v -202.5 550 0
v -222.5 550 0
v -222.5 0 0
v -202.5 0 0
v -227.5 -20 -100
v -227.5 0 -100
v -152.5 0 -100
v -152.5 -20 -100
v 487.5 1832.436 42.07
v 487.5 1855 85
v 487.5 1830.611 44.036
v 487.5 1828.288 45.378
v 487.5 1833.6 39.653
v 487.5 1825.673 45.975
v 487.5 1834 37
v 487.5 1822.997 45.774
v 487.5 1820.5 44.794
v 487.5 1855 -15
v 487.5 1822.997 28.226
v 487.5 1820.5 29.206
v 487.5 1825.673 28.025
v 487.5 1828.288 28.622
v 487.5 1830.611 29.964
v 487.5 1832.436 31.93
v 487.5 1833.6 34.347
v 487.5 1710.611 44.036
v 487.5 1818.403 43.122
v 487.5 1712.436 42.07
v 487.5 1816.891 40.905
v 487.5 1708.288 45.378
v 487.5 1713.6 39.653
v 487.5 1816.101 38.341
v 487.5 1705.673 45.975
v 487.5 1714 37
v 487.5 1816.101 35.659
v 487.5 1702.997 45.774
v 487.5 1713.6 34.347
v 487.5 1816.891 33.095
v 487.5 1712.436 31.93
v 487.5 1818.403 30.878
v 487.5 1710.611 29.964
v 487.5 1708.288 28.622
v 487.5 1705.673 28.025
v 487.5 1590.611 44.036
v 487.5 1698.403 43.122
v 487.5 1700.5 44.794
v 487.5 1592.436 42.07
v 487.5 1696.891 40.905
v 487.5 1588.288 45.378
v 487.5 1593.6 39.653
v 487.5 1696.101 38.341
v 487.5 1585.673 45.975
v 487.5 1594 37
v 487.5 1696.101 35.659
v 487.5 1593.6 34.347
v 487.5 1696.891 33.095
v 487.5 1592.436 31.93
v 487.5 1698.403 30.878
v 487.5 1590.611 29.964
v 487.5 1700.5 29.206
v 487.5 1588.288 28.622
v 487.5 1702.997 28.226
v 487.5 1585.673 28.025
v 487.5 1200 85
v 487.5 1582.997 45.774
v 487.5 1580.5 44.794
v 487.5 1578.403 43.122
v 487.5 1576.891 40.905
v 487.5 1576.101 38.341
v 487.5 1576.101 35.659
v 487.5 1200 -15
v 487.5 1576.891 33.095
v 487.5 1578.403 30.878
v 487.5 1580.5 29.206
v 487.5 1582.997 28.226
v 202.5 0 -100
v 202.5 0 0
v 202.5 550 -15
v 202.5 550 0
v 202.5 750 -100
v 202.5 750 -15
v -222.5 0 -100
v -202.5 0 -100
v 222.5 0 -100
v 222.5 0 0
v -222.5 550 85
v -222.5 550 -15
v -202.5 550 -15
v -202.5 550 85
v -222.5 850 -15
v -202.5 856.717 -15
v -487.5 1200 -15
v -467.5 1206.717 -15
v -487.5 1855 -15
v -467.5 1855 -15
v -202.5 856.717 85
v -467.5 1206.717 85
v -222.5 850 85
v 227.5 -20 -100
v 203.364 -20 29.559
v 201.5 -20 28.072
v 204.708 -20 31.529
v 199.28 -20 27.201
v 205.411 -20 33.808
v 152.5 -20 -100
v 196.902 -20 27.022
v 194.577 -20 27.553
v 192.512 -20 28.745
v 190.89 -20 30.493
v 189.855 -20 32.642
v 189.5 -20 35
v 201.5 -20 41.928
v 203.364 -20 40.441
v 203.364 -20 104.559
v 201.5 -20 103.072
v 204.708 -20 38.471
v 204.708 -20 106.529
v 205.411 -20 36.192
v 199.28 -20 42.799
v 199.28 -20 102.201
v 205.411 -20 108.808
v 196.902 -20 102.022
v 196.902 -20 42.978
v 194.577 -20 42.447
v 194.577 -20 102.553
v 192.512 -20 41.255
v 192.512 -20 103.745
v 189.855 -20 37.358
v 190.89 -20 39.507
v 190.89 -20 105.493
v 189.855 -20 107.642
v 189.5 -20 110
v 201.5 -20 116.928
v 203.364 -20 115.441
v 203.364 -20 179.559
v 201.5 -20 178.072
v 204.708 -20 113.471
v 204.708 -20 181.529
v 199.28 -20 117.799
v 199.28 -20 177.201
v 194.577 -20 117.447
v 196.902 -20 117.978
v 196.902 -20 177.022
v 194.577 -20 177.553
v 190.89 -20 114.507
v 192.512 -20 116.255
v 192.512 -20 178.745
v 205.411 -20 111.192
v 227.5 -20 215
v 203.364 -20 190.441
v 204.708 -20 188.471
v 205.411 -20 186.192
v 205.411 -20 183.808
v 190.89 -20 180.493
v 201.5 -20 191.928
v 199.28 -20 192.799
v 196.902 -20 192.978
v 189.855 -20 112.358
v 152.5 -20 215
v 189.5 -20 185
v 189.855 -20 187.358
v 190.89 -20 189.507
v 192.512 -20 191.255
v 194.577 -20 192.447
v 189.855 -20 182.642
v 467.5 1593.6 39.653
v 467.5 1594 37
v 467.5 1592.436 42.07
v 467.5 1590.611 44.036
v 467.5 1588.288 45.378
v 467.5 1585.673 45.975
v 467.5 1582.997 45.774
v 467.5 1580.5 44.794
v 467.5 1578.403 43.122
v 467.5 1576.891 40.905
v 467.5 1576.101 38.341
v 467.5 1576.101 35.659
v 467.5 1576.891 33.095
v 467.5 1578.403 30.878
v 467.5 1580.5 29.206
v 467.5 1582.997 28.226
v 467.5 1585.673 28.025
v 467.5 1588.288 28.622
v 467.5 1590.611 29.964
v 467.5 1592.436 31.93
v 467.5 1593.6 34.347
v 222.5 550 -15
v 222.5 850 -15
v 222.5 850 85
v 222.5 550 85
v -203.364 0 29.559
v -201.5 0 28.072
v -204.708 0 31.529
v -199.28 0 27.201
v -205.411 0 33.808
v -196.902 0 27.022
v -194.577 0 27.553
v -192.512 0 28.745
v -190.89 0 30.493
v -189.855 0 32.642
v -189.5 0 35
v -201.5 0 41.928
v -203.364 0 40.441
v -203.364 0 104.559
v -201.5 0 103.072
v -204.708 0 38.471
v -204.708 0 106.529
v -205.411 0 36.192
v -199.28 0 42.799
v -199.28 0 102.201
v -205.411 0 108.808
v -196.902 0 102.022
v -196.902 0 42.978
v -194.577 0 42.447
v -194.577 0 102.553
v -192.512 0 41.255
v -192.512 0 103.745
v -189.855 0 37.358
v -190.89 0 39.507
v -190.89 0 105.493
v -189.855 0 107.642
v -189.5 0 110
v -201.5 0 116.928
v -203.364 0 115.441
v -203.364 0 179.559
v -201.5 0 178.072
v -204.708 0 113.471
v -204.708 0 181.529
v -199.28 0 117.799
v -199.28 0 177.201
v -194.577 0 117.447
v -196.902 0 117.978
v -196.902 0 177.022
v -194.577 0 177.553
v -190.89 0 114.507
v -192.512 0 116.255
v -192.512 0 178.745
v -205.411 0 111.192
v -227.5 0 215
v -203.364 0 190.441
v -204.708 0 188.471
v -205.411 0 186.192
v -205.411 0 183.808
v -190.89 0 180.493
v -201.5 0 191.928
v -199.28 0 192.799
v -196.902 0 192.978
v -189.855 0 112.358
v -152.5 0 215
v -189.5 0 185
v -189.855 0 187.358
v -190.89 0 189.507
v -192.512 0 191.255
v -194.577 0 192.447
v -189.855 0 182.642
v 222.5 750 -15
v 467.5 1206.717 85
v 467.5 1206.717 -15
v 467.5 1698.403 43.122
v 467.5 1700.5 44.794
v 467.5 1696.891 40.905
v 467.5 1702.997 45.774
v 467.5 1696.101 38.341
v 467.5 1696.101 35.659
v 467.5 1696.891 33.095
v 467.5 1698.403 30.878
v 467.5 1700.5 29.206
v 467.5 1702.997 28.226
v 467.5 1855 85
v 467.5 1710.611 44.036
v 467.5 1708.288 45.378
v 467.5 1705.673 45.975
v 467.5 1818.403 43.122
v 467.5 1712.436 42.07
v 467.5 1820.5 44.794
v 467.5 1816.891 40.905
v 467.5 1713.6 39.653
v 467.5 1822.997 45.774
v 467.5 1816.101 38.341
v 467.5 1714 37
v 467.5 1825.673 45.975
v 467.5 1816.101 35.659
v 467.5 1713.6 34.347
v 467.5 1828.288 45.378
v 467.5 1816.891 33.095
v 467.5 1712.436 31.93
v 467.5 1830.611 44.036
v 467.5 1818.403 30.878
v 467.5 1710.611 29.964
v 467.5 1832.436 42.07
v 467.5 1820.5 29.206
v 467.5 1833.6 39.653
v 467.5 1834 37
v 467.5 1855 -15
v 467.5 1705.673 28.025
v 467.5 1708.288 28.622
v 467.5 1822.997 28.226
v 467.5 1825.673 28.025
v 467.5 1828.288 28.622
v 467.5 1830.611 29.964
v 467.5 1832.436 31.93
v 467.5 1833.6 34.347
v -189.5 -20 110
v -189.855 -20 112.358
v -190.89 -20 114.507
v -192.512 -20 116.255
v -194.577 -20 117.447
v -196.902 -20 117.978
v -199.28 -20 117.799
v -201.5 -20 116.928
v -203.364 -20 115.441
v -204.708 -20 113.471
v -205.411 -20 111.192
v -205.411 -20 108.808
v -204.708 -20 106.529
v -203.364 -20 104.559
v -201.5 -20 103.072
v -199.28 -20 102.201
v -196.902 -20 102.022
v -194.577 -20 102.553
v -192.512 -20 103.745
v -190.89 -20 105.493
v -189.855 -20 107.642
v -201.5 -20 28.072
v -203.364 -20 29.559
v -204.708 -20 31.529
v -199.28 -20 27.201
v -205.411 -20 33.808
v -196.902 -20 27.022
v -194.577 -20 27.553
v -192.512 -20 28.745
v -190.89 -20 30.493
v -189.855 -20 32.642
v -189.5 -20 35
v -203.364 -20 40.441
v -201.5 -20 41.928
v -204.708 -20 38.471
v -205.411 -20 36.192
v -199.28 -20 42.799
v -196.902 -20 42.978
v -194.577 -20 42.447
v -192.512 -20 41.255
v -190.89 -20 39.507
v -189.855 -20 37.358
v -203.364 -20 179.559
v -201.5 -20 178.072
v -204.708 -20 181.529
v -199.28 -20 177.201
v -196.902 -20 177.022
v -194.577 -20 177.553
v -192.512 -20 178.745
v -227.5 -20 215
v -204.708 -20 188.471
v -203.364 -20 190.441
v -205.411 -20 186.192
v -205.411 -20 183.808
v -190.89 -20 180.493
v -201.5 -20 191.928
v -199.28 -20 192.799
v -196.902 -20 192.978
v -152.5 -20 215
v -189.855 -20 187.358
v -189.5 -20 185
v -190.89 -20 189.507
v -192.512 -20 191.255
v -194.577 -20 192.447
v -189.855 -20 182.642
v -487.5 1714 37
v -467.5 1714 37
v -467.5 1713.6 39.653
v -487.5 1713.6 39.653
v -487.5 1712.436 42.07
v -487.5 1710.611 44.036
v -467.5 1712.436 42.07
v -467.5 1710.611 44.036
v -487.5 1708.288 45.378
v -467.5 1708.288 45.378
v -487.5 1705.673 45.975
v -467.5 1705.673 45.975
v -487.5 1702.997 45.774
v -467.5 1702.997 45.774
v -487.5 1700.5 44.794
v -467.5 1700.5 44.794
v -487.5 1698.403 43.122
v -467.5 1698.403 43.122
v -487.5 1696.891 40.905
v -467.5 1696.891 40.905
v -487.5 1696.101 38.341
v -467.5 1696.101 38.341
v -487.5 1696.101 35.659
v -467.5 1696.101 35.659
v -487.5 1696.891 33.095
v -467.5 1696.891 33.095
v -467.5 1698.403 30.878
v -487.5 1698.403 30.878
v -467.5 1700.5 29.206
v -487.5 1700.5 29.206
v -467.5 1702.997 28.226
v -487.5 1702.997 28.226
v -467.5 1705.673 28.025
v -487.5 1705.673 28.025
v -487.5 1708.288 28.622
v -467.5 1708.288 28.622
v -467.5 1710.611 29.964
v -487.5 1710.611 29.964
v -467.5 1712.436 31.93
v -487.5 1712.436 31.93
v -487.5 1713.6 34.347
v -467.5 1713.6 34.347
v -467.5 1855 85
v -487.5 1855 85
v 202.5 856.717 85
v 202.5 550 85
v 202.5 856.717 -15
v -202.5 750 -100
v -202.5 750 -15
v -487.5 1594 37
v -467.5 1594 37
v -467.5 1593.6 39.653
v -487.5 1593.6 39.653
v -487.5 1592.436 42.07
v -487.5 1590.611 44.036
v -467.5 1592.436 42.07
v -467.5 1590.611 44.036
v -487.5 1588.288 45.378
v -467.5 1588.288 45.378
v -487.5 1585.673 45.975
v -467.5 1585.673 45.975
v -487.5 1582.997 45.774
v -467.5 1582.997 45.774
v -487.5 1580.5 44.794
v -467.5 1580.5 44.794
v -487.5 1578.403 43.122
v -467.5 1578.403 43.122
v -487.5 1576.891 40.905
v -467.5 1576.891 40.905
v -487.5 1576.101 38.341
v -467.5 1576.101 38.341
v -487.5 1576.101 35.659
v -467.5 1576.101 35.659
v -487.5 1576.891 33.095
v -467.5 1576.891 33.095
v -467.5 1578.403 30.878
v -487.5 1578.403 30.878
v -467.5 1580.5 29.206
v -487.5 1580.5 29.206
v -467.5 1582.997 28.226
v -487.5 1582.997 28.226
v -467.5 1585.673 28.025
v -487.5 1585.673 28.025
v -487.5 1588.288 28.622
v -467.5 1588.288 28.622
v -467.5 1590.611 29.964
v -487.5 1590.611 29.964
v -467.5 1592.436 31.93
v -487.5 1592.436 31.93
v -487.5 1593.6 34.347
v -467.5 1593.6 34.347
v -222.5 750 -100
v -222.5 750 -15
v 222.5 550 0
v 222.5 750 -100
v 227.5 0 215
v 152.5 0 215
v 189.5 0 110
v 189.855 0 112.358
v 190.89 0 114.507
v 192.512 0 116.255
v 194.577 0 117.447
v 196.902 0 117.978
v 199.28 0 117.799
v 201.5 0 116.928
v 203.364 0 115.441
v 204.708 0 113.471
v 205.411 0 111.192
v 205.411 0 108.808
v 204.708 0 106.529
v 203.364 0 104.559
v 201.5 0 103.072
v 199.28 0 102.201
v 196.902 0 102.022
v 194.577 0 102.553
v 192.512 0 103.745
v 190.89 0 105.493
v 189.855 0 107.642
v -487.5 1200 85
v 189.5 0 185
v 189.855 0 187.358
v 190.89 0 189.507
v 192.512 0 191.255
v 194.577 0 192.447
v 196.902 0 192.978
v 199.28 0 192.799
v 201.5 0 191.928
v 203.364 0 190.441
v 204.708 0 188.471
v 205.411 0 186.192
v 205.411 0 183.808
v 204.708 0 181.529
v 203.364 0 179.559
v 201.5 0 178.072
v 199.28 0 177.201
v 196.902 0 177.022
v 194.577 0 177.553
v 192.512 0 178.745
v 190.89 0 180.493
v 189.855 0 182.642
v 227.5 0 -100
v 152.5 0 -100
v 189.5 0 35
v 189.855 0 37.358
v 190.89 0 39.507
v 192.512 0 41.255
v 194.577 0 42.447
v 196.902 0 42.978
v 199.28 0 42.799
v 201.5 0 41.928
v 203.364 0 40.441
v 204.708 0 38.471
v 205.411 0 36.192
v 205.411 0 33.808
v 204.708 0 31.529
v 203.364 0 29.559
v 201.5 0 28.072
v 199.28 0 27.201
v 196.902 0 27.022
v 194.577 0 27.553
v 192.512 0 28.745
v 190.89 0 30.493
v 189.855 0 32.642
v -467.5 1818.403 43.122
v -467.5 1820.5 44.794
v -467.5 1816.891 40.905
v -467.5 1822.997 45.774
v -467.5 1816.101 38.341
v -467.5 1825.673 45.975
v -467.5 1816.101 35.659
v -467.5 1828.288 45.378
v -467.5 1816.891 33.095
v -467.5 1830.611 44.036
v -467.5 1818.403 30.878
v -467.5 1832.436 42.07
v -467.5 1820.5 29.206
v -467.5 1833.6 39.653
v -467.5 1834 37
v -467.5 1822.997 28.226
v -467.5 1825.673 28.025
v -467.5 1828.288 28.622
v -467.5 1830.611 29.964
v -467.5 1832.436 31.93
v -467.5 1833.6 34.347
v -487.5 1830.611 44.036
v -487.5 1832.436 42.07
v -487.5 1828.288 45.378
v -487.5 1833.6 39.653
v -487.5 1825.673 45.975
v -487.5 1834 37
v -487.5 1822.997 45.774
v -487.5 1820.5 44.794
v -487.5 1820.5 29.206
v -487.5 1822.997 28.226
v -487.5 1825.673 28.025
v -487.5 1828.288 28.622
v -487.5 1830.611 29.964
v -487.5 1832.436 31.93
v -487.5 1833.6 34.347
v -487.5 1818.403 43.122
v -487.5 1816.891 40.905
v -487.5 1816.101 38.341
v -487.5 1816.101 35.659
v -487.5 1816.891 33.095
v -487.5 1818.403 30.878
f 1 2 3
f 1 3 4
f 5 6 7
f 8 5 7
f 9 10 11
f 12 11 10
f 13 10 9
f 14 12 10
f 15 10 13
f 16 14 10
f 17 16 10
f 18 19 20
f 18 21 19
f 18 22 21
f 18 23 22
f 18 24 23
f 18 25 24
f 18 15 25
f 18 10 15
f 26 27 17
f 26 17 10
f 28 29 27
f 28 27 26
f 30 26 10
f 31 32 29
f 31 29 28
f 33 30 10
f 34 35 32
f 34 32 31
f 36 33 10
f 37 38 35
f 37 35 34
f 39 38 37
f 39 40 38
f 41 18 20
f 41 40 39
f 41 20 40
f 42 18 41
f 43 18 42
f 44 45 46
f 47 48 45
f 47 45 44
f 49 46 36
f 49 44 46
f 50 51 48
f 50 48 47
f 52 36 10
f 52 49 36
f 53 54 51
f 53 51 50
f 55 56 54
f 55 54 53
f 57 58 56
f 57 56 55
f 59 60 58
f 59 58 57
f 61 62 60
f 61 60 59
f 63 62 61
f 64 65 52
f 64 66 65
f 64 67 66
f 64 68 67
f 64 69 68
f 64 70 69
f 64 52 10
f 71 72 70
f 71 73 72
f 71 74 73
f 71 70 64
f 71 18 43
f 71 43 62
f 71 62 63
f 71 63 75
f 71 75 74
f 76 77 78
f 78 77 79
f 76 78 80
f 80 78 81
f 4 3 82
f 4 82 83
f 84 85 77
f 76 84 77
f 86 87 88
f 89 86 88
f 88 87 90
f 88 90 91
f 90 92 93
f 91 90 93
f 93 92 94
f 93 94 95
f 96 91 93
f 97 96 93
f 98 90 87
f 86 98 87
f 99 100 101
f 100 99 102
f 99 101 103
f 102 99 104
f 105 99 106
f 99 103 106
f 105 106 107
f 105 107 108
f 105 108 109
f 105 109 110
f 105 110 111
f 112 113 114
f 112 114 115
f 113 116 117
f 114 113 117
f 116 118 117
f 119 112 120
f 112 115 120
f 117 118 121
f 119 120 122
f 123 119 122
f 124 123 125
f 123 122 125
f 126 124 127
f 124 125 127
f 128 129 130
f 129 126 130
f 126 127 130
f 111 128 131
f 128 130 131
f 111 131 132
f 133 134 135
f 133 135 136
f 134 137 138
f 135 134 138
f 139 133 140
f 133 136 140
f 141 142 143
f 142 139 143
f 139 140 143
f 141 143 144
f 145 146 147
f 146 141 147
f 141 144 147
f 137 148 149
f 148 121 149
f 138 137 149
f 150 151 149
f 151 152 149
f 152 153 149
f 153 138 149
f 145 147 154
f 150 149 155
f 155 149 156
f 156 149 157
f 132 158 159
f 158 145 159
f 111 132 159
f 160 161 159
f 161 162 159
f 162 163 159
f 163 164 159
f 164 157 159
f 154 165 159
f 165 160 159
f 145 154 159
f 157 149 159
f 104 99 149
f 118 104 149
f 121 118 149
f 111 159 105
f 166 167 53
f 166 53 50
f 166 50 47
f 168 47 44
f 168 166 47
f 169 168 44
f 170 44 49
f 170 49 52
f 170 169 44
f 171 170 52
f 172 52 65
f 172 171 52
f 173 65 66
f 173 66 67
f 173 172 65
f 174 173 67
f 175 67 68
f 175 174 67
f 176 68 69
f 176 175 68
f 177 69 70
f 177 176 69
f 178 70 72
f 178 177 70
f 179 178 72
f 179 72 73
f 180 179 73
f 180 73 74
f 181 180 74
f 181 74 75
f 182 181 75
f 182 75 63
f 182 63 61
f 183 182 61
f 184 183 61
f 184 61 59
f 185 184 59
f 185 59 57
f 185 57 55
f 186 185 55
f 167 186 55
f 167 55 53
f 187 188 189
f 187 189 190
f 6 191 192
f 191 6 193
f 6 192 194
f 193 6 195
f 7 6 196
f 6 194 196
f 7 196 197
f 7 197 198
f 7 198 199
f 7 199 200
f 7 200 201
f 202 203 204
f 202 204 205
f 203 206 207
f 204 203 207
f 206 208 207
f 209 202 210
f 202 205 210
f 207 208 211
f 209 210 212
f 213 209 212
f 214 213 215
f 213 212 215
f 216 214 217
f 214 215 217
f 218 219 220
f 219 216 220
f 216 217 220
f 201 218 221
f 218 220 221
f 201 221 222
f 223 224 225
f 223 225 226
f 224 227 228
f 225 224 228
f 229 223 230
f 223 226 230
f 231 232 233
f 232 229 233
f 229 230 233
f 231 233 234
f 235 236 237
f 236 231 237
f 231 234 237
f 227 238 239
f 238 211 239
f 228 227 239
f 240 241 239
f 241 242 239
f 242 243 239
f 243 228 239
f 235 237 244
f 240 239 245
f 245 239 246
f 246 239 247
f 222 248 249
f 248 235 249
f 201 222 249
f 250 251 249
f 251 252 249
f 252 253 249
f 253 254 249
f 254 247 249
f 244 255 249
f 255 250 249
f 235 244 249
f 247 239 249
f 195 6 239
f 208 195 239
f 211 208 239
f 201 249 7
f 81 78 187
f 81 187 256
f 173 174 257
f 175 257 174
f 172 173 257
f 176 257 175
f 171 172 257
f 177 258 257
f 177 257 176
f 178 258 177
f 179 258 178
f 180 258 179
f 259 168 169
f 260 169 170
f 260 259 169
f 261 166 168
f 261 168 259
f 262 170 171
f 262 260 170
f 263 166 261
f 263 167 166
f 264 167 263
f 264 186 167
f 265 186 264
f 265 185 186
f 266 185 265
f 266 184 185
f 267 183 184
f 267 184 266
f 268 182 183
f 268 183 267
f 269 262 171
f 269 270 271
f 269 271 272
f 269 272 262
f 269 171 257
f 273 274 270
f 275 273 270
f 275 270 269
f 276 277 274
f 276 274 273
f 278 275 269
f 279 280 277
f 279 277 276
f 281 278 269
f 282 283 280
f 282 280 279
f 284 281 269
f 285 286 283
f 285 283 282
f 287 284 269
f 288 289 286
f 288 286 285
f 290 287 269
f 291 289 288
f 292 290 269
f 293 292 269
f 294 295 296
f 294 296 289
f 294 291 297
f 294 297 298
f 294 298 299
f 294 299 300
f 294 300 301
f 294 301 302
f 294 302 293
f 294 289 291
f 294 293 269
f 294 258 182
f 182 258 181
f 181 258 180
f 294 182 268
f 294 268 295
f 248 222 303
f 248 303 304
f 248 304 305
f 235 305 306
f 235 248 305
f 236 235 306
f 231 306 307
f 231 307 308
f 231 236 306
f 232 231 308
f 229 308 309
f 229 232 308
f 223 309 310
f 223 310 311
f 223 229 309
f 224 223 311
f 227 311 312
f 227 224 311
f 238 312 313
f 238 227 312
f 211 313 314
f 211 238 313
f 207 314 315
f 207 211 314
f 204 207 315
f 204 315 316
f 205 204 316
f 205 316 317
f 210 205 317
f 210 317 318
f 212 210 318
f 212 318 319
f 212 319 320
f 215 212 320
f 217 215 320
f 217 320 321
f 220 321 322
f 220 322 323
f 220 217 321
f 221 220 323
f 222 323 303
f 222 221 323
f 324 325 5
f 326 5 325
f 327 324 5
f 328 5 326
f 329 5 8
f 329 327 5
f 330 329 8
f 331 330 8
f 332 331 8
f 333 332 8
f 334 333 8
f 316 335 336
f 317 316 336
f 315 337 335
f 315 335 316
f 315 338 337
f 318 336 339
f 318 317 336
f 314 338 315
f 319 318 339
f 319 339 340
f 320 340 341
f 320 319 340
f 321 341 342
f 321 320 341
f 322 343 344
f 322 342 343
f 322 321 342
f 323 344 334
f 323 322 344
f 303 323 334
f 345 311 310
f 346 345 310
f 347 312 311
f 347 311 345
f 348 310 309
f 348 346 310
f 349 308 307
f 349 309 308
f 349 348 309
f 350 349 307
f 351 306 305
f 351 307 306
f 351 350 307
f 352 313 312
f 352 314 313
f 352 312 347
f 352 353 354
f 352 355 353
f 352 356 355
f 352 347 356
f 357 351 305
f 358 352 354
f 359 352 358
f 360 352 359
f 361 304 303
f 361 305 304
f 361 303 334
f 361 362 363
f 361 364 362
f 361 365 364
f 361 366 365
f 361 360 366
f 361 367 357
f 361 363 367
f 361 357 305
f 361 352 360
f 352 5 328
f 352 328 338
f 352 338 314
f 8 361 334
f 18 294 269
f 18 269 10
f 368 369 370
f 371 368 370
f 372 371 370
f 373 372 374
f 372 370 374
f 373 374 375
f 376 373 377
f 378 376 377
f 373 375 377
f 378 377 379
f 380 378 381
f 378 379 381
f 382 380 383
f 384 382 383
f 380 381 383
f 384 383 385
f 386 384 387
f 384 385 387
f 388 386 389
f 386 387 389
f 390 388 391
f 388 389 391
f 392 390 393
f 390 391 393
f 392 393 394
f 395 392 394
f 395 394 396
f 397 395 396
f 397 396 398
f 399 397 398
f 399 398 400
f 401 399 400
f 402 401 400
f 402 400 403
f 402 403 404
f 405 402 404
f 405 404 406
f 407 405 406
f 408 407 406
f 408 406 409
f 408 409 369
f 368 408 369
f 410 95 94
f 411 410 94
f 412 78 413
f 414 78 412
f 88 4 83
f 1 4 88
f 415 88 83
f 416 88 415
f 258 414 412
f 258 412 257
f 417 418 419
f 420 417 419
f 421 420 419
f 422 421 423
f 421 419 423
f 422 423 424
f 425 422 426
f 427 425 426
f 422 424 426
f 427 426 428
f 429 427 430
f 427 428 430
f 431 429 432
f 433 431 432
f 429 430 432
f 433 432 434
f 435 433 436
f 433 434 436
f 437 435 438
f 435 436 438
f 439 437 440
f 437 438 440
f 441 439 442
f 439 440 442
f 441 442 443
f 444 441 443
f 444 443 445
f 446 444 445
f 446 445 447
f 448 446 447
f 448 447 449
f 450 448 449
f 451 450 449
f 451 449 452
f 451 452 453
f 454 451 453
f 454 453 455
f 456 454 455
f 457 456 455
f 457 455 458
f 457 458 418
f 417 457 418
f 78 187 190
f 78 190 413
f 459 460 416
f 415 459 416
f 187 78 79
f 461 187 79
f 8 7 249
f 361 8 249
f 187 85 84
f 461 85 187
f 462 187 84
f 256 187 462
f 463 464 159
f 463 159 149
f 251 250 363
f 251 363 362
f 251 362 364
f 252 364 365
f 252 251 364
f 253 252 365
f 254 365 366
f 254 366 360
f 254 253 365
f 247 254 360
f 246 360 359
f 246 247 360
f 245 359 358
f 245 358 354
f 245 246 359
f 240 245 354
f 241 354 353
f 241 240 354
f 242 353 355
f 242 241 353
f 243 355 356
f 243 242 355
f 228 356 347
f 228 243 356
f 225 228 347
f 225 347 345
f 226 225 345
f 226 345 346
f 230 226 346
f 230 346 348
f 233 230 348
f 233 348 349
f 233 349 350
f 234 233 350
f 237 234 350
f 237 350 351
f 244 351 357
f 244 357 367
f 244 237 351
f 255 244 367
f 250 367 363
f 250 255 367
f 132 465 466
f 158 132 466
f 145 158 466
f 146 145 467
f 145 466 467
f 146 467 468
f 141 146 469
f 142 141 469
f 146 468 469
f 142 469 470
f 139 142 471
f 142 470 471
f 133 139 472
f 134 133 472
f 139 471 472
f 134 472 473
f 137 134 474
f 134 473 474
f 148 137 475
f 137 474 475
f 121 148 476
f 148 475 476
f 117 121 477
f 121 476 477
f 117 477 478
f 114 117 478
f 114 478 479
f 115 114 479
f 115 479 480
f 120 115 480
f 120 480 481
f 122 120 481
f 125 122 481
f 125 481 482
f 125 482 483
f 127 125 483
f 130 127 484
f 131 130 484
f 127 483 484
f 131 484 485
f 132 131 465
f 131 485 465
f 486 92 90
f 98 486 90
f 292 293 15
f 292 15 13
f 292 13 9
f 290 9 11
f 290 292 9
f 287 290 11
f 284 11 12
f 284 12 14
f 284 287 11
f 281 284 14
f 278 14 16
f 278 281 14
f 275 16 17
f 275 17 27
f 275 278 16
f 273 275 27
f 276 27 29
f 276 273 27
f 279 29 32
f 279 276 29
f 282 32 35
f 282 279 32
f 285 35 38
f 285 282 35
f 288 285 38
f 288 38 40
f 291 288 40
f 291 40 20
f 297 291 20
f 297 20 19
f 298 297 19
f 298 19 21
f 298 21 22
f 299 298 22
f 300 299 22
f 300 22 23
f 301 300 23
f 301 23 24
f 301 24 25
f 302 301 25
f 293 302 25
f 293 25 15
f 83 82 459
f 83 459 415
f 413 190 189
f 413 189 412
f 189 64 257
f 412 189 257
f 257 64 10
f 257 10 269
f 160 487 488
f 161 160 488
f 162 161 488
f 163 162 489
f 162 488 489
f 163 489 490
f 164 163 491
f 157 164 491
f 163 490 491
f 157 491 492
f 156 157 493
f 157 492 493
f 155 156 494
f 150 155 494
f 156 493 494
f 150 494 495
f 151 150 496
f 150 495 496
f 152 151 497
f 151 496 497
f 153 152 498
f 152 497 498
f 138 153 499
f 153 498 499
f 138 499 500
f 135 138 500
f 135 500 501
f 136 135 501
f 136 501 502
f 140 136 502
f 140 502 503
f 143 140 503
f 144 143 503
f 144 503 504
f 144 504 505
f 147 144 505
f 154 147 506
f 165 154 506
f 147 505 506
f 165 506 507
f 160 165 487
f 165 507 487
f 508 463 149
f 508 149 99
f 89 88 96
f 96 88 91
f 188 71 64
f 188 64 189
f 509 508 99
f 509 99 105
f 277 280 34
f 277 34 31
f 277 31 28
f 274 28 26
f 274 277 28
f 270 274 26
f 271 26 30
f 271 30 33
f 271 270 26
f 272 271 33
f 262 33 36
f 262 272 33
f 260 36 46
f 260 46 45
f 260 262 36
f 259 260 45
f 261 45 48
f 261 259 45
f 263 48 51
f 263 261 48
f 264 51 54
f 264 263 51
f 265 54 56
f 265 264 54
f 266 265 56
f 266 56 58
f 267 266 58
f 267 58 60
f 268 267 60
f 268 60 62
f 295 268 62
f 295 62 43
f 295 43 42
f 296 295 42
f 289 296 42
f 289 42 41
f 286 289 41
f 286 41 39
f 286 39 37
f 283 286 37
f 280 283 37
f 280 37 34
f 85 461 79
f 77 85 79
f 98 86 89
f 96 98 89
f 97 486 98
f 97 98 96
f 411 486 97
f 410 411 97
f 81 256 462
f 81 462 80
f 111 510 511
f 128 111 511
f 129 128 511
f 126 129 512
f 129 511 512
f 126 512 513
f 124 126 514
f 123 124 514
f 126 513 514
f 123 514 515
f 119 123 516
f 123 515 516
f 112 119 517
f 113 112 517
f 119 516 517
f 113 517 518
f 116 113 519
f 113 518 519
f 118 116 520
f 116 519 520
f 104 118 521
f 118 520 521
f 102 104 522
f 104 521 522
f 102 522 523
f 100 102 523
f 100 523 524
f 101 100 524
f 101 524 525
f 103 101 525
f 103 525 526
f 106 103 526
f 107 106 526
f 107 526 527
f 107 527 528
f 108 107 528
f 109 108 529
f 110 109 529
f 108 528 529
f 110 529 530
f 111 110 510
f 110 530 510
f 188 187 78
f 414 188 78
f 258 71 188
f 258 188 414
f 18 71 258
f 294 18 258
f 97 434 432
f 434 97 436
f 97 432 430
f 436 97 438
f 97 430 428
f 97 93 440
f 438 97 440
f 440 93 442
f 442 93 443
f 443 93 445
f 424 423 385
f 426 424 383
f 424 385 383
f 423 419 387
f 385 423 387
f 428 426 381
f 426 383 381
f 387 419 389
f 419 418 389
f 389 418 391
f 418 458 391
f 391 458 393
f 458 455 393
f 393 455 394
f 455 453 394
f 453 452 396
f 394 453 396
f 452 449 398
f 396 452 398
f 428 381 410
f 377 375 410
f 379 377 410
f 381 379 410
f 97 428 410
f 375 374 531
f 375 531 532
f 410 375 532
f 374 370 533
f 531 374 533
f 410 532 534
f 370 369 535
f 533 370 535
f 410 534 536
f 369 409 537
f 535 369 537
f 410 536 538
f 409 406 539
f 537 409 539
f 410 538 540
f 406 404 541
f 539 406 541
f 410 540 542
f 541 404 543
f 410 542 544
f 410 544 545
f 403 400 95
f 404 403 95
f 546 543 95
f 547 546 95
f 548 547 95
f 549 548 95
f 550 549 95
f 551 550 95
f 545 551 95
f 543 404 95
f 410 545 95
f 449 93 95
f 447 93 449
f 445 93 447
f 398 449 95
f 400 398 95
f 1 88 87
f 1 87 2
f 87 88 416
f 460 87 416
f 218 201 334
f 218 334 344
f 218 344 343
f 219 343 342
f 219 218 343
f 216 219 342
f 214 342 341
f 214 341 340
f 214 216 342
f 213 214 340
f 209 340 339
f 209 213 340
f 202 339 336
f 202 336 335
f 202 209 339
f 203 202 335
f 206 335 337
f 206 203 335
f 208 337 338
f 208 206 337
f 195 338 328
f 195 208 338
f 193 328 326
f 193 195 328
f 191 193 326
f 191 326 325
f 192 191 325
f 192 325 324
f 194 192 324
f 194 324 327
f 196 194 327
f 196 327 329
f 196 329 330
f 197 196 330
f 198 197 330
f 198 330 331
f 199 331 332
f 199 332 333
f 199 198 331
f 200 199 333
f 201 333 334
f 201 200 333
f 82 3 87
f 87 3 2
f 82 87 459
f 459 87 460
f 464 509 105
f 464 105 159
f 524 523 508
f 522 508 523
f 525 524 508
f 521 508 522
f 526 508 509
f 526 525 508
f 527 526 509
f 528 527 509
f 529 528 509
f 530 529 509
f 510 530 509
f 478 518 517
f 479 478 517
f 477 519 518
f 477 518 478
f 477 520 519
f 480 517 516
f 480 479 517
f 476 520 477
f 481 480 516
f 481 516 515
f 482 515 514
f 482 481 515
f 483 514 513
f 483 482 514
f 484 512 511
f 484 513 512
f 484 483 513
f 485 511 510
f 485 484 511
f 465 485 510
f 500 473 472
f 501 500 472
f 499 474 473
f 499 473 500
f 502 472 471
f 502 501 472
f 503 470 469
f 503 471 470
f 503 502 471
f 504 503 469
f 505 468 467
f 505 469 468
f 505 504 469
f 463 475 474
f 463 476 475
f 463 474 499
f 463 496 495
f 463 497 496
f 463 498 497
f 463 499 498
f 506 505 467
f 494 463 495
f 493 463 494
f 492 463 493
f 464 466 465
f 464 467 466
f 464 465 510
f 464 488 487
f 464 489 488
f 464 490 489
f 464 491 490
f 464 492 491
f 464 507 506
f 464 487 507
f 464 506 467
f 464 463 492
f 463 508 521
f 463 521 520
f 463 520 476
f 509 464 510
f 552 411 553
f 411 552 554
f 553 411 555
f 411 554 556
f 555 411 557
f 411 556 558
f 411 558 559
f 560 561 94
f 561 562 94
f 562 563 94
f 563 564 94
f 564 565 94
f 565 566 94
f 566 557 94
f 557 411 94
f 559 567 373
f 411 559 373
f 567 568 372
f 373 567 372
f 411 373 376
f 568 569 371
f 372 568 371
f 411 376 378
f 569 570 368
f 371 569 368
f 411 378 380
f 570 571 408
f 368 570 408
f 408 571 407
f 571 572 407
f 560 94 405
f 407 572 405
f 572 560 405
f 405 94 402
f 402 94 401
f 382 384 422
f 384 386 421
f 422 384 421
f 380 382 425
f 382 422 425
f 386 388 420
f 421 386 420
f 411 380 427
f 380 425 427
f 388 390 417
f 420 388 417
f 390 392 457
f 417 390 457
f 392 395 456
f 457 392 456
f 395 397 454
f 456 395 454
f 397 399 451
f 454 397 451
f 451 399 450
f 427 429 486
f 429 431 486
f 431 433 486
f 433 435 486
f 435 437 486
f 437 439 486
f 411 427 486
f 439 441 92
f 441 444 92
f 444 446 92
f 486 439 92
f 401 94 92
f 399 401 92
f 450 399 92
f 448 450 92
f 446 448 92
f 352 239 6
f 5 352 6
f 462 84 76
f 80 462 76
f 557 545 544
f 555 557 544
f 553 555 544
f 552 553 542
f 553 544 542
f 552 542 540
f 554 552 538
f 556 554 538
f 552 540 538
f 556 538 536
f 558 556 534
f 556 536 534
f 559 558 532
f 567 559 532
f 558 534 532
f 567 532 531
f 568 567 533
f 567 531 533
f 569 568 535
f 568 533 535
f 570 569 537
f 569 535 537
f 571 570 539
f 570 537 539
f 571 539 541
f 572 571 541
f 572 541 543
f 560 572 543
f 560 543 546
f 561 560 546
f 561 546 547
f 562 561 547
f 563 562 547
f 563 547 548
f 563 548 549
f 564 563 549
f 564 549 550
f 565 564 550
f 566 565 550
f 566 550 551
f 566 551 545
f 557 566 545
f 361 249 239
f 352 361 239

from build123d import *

# Parameters (mm, degrees)
F0_W     = 20
F0_H     = 750
F1_DEPTH = 100
F2_W     = 200
F2_H     = 15
F3_DEPTH = 20.001
F4_W     = 20
F4_H     = 200
F5_DEPTH = 100
F6_R     = 9
F7_DEPTH = 20.001
F8_R     = 8
F8_W     = 20
F8_H     = 100
F9_DEPTH = 20


with BuildPart() as f1:
    # F0 (on Top) → F1 (new body)
    with BuildSketch(Plane.XY):
        with Locations((-212.5, 375)):
            Rectangle(F0_W, F0_H)
    extrude(amount=-F1_DEPTH)

    # F2 (on face) → F3 (cut, through all)
    with BuildSketch(Plane.YZ.offset(-202.5)):
        with Locations((650, -7.5)):
            Rectangle(F2_W, F2_H)
    extrude(amount=-F3_DEPTH, mode=Mode.SUBTRACT)


with BuildPart() as f5:
    # F4 (on face) → F5 (new body)
    with BuildSketch(Plane.XY.offset(-15)):
        Polygon((-222.5, 850), (-222.5, 750), (-202.5, 750), (-202.5, 856.7173249649), (-467.5, 1206.7173249649), (-467.5, 1855), (-487.5, 1855), (-487.5, 1200), align=None)
        with Locations((-212.5, 650)):
            Rectangle(F4_W, F4_H)
    extrude(amount=F5_DEPTH)

    # F6 (on face) → F7 (cut, through all)
    with BuildSketch(Plane.YZ.offset(-467.5)):
        with Locations((1585, 37)):
            Circle(F6_R)
        with Locations((1705, 37)):
            Circle(F6_R)
        with Locations((1825, 37)):
            Circle(F6_R)
    extrude(amount=-F7_DEPTH, mode=Mode.SUBTRACT)


with BuildPart() as f9:
    # F8 (on face) → F9 (new body)
    with BuildSketch(Plane.XZ):
        Polygon((-227.5, 215), (-227.5, -100), (-222.5, -100), (-222.5, 0), (-202.5, 0), (-202.5, -100), (-152.5, -100), (-152.5, 215), align=None)
        with Locations((-197.5, 35)):
            Circle(F8_R, mode=Mode.SUBTRACT)
        with Locations((-197.5, 110)):
            Circle(F8_R, mode=Mode.SUBTRACT)
        with Locations((-197.5, 185)):
            Circle(F8_R, mode=Mode.SUBTRACT)
        with Locations((-212.5, -50)):
            Rectangle(F8_W, F8_H)
    extrude(amount=F9_DEPTH)


with BuildPart() as f10_1:
    # F10: instance of F5
    add(f5.part.mirror(Plane.YZ))


with BuildPart() as f10_2:
    # F10: instance of F1
    add(f1.part.mirror(Plane.YZ))


with BuildPart() as f10_3:
    # F10: instance of F9
    add(f9.part.mirror(Plane.YZ))


solid = Compound([f1.part, f5.part, f9.part, f10_1.part, f10_2.part, f10_3.part])
